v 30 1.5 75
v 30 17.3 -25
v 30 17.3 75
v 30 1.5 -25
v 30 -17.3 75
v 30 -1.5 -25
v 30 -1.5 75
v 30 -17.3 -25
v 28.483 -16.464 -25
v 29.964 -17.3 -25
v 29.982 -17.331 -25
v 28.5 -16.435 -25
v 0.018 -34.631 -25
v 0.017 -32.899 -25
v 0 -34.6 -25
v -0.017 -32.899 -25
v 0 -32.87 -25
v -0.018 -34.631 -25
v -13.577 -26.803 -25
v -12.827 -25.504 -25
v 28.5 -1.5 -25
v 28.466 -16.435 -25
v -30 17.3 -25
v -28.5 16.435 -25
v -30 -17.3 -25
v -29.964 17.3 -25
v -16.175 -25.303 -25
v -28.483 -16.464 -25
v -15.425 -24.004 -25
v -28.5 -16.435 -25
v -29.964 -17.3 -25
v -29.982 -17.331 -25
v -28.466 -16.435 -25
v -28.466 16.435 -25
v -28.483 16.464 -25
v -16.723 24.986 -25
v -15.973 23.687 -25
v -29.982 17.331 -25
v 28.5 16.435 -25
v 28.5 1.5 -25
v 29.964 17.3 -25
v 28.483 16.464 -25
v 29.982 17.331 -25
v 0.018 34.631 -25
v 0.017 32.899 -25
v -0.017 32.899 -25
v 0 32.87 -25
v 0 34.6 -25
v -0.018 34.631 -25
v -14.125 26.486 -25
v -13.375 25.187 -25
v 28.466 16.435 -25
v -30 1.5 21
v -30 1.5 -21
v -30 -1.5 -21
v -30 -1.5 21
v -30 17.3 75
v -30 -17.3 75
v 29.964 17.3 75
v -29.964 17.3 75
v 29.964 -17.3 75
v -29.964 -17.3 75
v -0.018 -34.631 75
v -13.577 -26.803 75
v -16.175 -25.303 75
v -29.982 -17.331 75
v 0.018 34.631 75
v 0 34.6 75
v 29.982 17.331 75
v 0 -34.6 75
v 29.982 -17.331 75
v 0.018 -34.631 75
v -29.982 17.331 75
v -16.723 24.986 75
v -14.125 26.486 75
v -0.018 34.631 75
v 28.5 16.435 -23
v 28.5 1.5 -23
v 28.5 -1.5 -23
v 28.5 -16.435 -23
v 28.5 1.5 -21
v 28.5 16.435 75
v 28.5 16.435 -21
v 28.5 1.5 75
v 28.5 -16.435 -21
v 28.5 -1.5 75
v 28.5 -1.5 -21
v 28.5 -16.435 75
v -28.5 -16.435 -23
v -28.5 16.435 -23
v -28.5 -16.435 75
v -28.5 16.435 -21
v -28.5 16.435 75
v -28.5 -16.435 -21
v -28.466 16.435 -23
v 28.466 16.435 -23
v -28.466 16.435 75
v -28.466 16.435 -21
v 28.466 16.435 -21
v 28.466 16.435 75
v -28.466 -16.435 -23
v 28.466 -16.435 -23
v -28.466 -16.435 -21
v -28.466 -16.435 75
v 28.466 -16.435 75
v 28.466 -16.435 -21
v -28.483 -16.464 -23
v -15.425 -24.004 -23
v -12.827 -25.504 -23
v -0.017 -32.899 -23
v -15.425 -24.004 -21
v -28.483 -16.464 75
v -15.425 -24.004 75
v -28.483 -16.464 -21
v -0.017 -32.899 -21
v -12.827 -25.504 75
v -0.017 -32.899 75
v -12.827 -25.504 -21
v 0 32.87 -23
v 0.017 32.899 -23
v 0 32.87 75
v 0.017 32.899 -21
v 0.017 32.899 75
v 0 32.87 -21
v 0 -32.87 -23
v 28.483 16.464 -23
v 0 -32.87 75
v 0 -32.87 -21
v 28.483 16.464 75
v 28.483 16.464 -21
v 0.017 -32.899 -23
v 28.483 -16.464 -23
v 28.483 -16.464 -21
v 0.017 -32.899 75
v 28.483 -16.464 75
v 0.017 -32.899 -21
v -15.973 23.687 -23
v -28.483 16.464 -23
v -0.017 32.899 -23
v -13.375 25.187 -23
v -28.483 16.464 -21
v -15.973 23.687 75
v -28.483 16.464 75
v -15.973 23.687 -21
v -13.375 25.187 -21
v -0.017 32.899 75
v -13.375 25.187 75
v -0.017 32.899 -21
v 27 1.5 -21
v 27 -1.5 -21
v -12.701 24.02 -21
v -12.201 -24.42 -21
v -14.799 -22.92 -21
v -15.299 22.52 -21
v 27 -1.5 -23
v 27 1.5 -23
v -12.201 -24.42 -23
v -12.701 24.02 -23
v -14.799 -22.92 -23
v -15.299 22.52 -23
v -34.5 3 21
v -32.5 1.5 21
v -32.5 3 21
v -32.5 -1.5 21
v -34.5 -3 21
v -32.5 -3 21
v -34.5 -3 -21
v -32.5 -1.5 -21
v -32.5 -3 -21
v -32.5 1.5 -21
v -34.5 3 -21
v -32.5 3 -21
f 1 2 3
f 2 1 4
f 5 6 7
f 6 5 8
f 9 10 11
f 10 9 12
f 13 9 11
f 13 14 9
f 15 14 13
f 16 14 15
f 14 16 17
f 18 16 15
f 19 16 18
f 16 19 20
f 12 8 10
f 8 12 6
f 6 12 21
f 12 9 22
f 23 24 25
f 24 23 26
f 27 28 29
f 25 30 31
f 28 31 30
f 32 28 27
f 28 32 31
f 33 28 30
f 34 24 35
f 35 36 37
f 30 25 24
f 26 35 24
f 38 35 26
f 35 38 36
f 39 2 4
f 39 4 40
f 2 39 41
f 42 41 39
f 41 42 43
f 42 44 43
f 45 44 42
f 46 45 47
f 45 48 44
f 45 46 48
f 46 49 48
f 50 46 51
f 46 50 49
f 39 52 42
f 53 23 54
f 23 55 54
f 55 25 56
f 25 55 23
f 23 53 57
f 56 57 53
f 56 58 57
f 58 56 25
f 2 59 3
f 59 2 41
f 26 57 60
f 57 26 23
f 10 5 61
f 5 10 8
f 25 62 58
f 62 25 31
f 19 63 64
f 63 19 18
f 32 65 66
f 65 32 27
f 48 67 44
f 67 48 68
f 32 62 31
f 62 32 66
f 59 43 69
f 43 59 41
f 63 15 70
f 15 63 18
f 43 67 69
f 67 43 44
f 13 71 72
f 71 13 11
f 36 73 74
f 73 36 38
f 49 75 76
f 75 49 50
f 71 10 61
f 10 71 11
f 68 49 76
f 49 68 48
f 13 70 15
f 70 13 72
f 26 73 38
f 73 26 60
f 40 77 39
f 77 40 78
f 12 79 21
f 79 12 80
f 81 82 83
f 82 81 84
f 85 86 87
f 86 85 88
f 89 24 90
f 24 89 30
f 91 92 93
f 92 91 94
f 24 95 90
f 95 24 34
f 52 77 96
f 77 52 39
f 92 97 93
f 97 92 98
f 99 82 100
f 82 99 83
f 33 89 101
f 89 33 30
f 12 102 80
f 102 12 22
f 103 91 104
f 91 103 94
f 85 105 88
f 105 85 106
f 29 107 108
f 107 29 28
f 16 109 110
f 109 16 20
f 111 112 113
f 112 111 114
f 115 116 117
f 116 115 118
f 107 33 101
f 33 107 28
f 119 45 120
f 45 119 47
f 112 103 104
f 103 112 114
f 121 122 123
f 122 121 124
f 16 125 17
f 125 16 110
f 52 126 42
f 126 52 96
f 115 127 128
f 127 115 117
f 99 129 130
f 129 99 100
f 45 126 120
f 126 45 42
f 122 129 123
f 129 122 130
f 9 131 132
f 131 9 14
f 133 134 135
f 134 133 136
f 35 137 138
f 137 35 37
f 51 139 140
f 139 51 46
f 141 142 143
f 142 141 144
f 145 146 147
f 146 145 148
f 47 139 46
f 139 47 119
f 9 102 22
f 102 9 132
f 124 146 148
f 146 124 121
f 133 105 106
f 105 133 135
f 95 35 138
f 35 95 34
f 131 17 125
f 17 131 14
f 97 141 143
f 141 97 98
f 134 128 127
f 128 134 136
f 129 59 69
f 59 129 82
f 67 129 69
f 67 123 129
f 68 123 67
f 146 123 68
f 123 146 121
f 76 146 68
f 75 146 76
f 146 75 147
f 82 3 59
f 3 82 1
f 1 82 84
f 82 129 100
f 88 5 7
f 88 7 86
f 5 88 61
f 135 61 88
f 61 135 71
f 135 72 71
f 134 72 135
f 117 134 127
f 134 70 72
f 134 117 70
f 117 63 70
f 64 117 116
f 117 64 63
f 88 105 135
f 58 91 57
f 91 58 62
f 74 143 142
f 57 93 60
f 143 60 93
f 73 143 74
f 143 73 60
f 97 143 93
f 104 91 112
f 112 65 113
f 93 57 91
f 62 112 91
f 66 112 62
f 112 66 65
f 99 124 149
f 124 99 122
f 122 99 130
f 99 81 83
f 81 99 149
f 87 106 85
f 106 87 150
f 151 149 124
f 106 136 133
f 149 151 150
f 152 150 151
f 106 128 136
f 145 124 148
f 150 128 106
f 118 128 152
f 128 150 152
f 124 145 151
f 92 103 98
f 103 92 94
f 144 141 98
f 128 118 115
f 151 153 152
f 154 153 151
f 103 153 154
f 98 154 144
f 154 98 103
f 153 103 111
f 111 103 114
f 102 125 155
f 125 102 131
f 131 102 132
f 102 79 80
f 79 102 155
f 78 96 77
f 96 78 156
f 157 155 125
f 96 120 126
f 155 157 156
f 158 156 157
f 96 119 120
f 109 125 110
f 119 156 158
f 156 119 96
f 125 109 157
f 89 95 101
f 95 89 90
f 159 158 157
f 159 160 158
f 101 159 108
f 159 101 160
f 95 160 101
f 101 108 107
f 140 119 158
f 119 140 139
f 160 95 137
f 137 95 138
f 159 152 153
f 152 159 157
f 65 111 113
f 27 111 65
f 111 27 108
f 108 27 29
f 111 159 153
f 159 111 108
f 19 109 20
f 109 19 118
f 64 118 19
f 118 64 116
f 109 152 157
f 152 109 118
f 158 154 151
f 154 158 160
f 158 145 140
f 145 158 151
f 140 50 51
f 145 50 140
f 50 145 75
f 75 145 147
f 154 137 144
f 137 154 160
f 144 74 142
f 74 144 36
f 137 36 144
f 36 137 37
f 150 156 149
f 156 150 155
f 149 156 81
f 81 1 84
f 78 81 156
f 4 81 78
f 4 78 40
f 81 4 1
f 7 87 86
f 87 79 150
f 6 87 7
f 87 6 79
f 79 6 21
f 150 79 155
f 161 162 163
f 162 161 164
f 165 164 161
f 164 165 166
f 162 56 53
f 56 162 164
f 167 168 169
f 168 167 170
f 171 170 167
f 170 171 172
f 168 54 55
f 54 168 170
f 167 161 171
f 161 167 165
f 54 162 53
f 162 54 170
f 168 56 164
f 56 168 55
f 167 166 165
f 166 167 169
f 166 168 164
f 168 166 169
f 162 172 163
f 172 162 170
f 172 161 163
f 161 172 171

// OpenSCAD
// Tall pen_holder

x = 60;
y = 34.6;
z = 50;

module hexagon()
{
	difference() {
		union() {
			cube([x,y,z], center=true);
			rotate([0,0,60]) cube([x,y,z], center=true);
			rotate([0,0,-60]) cube([x,y,z], center=true);
		}
		union() {
			cube([x*0.95,y*0.95,z*2], center=true);
			rotate([0,0,60]) cube([x*0.95,y*0.95,z*2], center=true);
			rotate([0,0,-60]) cube([x*0.95,y*0.95,z*2], center=true);
		}
	}

}


difference() {
	union() {
		hexagon();
		translate([0,0,50]) hexagon(); // extra to make it tall
		translate([0,0,-22])
			union() {
				cube([x,y,2], center=true);
				rotate([0,0,60]) cube([x,y,2], center=true);
				rotate([0,0,-60]) cube([x,y,2], center=true);
			}
		}
	union() {
		translate([-16,-28,0]) rotate([0,0,60]) cube([10,3,200], center=true);		
		//translate([-32,0,0]) rotate([0,0,0]) cube([10,3,100], center=true);
		translate([-16.5,27.6,0]) rotate([0,0,-60]) cube([10,3,200], center=true);
		//translate([16,28,0]) rotate([0,0,60]) cube([10,3,100], center=true);
		translate([32,0,0]) rotate([0,0,0]) cube([10,3,200], center=true);
		//translate([16.5,-27.6,0]) rotate([0,0,-60]) cube([10,3,100], center=true);
	}
}


		translate([-32,0,0]) rotate([0,0,0]) cube([5,3,42], center=true);
		translate([-33.5,0,0]) rotate([0,0,90]) cube([6,2,42], center=true);





	
